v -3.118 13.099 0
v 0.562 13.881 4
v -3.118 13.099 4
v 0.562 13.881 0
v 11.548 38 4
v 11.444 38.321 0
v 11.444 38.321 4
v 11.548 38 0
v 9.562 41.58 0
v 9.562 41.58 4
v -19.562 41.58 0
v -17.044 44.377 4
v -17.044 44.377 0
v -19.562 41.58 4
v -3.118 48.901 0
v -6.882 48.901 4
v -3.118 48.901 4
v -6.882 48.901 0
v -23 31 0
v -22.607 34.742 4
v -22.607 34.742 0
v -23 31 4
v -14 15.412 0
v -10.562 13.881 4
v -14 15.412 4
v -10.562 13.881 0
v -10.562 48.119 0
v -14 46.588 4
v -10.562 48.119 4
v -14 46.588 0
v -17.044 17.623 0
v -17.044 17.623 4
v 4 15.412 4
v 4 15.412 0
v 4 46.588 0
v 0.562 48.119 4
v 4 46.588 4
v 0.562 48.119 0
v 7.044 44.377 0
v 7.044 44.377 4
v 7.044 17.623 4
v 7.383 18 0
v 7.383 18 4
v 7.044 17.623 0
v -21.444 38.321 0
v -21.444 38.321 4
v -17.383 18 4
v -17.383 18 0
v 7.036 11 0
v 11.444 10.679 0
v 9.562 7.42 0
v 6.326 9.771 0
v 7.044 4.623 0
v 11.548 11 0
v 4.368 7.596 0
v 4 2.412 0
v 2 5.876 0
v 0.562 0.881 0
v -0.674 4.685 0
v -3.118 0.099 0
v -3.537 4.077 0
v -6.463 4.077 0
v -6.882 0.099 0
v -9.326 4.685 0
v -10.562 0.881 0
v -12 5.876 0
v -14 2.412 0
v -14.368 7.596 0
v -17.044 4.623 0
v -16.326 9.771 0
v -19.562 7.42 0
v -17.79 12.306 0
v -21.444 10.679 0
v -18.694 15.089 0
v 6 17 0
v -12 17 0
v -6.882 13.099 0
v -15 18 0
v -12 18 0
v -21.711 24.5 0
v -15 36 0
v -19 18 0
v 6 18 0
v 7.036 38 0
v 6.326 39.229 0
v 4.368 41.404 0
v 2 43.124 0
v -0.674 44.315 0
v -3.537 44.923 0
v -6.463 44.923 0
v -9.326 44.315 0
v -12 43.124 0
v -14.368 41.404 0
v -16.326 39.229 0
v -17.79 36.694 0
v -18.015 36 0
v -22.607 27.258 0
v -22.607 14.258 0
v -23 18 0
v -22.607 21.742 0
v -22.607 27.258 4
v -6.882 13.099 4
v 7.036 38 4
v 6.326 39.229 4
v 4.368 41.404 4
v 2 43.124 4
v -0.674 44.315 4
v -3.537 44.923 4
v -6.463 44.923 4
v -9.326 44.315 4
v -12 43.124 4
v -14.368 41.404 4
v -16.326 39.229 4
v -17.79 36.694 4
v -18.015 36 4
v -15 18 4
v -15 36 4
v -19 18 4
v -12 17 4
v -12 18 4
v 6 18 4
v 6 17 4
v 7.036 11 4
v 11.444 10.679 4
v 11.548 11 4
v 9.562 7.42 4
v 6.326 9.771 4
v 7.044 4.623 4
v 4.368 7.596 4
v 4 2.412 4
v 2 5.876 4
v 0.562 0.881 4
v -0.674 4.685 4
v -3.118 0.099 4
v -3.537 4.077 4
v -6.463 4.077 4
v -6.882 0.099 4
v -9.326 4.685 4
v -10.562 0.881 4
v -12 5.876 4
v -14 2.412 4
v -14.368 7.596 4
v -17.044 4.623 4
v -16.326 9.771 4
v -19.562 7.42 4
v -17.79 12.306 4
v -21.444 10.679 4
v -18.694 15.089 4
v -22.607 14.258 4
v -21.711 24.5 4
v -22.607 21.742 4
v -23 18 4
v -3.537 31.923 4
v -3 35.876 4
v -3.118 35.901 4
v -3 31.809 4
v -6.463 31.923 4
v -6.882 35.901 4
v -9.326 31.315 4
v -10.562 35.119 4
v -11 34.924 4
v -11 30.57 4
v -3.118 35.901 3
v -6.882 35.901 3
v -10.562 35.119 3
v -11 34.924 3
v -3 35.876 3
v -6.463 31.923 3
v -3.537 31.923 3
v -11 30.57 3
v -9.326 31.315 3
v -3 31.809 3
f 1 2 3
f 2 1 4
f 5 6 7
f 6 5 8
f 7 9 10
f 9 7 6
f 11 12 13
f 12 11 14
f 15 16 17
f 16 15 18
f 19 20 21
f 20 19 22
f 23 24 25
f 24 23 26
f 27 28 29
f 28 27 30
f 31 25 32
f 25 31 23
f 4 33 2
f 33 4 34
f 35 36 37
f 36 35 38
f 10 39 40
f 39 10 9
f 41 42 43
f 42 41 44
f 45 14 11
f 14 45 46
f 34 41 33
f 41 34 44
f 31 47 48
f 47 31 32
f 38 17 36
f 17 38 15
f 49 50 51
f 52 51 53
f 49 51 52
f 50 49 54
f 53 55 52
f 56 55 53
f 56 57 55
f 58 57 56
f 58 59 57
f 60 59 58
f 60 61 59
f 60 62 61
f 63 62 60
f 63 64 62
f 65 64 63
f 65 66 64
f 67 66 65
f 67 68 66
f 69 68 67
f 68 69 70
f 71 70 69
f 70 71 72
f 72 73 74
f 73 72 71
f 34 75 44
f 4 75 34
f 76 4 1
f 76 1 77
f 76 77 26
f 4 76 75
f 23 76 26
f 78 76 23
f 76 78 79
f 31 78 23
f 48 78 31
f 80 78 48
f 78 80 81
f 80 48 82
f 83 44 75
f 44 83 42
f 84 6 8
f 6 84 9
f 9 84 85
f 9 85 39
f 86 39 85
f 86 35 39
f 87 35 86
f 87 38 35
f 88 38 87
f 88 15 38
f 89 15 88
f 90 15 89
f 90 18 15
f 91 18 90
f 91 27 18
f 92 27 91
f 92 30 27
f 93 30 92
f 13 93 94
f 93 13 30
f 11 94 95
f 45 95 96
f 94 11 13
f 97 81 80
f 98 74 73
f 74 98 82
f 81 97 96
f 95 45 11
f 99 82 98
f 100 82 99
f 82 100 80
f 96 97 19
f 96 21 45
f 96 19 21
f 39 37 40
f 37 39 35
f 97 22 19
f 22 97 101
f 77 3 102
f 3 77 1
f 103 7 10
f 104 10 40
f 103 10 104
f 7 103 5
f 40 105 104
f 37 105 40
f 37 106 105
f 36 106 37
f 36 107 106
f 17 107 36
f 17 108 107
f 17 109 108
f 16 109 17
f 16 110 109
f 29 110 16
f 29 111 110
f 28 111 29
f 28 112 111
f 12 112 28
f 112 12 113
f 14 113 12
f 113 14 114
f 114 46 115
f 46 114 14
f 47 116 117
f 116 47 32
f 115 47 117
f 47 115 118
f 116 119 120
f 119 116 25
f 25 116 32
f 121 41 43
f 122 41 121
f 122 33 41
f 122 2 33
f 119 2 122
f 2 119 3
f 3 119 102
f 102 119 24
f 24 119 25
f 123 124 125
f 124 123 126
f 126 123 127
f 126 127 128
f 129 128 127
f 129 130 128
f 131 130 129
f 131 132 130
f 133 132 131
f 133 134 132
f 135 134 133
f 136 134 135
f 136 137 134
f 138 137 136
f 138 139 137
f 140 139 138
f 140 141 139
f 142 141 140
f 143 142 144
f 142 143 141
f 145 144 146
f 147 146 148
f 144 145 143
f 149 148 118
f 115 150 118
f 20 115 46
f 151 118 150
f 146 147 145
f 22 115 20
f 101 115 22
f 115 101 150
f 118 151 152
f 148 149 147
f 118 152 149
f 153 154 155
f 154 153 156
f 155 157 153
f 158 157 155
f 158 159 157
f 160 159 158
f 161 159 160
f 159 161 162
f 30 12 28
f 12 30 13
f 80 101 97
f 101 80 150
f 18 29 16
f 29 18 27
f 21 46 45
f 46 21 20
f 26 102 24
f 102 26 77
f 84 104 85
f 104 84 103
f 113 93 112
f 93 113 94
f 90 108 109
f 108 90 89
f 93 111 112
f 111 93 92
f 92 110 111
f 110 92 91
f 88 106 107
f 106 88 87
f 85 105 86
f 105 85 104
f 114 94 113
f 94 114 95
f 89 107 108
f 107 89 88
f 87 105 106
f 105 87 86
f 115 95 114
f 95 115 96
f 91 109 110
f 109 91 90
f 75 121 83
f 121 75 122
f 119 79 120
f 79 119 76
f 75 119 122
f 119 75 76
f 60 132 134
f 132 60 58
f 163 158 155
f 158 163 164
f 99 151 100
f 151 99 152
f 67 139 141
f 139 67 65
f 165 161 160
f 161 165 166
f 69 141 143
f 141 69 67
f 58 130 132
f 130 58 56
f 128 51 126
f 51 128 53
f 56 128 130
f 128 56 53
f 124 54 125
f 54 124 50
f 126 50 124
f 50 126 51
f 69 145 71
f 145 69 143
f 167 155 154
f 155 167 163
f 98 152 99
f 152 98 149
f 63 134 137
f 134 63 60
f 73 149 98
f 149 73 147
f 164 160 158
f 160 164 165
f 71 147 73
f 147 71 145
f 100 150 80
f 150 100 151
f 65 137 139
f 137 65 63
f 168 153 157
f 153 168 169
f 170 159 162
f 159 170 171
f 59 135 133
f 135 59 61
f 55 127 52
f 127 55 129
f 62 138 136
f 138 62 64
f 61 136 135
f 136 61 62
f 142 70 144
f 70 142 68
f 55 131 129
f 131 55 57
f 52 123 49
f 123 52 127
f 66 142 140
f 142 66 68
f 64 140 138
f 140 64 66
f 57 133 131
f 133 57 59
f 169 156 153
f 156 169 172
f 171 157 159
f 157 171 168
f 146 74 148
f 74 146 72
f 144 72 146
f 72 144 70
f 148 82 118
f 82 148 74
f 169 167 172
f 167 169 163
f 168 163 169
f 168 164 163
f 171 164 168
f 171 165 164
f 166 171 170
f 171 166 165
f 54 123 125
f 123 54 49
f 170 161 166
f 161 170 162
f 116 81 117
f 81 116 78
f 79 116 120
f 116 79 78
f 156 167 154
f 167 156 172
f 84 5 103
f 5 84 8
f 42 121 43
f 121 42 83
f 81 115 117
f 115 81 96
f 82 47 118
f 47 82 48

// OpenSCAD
// буква с
module c(h=40,eh=20,z=3,2z=5){
translate([-45,5,0])
union(){

translate([26,13,0]) cube([z,h,z]);
difference(){
union(){
	
  difference(){
  translate([40,26,0]) cylinder(z,h,h);
  translate([40,26,0]) cylinder(2z,2h,2h);
  translate([33,12,0]) cube([h,eh,2z]);

}

difference(){
  translate([40,13,0]) cylinder(z,h,h);
  translate([40,13,0]) cylinder(2z,2h,2h);
  translate([32,15,-1]) cube([h,eh,z]);
  translate([40,6,0]) cube([h,eh,z]);
}
}
  translate([30,13,0]) cube([z,h,z]);
  translate([42,13,0]) cube([h,eh,z]);
}
}
}

c(h=18,eh=20,z=4,2z=8,2h=14);
